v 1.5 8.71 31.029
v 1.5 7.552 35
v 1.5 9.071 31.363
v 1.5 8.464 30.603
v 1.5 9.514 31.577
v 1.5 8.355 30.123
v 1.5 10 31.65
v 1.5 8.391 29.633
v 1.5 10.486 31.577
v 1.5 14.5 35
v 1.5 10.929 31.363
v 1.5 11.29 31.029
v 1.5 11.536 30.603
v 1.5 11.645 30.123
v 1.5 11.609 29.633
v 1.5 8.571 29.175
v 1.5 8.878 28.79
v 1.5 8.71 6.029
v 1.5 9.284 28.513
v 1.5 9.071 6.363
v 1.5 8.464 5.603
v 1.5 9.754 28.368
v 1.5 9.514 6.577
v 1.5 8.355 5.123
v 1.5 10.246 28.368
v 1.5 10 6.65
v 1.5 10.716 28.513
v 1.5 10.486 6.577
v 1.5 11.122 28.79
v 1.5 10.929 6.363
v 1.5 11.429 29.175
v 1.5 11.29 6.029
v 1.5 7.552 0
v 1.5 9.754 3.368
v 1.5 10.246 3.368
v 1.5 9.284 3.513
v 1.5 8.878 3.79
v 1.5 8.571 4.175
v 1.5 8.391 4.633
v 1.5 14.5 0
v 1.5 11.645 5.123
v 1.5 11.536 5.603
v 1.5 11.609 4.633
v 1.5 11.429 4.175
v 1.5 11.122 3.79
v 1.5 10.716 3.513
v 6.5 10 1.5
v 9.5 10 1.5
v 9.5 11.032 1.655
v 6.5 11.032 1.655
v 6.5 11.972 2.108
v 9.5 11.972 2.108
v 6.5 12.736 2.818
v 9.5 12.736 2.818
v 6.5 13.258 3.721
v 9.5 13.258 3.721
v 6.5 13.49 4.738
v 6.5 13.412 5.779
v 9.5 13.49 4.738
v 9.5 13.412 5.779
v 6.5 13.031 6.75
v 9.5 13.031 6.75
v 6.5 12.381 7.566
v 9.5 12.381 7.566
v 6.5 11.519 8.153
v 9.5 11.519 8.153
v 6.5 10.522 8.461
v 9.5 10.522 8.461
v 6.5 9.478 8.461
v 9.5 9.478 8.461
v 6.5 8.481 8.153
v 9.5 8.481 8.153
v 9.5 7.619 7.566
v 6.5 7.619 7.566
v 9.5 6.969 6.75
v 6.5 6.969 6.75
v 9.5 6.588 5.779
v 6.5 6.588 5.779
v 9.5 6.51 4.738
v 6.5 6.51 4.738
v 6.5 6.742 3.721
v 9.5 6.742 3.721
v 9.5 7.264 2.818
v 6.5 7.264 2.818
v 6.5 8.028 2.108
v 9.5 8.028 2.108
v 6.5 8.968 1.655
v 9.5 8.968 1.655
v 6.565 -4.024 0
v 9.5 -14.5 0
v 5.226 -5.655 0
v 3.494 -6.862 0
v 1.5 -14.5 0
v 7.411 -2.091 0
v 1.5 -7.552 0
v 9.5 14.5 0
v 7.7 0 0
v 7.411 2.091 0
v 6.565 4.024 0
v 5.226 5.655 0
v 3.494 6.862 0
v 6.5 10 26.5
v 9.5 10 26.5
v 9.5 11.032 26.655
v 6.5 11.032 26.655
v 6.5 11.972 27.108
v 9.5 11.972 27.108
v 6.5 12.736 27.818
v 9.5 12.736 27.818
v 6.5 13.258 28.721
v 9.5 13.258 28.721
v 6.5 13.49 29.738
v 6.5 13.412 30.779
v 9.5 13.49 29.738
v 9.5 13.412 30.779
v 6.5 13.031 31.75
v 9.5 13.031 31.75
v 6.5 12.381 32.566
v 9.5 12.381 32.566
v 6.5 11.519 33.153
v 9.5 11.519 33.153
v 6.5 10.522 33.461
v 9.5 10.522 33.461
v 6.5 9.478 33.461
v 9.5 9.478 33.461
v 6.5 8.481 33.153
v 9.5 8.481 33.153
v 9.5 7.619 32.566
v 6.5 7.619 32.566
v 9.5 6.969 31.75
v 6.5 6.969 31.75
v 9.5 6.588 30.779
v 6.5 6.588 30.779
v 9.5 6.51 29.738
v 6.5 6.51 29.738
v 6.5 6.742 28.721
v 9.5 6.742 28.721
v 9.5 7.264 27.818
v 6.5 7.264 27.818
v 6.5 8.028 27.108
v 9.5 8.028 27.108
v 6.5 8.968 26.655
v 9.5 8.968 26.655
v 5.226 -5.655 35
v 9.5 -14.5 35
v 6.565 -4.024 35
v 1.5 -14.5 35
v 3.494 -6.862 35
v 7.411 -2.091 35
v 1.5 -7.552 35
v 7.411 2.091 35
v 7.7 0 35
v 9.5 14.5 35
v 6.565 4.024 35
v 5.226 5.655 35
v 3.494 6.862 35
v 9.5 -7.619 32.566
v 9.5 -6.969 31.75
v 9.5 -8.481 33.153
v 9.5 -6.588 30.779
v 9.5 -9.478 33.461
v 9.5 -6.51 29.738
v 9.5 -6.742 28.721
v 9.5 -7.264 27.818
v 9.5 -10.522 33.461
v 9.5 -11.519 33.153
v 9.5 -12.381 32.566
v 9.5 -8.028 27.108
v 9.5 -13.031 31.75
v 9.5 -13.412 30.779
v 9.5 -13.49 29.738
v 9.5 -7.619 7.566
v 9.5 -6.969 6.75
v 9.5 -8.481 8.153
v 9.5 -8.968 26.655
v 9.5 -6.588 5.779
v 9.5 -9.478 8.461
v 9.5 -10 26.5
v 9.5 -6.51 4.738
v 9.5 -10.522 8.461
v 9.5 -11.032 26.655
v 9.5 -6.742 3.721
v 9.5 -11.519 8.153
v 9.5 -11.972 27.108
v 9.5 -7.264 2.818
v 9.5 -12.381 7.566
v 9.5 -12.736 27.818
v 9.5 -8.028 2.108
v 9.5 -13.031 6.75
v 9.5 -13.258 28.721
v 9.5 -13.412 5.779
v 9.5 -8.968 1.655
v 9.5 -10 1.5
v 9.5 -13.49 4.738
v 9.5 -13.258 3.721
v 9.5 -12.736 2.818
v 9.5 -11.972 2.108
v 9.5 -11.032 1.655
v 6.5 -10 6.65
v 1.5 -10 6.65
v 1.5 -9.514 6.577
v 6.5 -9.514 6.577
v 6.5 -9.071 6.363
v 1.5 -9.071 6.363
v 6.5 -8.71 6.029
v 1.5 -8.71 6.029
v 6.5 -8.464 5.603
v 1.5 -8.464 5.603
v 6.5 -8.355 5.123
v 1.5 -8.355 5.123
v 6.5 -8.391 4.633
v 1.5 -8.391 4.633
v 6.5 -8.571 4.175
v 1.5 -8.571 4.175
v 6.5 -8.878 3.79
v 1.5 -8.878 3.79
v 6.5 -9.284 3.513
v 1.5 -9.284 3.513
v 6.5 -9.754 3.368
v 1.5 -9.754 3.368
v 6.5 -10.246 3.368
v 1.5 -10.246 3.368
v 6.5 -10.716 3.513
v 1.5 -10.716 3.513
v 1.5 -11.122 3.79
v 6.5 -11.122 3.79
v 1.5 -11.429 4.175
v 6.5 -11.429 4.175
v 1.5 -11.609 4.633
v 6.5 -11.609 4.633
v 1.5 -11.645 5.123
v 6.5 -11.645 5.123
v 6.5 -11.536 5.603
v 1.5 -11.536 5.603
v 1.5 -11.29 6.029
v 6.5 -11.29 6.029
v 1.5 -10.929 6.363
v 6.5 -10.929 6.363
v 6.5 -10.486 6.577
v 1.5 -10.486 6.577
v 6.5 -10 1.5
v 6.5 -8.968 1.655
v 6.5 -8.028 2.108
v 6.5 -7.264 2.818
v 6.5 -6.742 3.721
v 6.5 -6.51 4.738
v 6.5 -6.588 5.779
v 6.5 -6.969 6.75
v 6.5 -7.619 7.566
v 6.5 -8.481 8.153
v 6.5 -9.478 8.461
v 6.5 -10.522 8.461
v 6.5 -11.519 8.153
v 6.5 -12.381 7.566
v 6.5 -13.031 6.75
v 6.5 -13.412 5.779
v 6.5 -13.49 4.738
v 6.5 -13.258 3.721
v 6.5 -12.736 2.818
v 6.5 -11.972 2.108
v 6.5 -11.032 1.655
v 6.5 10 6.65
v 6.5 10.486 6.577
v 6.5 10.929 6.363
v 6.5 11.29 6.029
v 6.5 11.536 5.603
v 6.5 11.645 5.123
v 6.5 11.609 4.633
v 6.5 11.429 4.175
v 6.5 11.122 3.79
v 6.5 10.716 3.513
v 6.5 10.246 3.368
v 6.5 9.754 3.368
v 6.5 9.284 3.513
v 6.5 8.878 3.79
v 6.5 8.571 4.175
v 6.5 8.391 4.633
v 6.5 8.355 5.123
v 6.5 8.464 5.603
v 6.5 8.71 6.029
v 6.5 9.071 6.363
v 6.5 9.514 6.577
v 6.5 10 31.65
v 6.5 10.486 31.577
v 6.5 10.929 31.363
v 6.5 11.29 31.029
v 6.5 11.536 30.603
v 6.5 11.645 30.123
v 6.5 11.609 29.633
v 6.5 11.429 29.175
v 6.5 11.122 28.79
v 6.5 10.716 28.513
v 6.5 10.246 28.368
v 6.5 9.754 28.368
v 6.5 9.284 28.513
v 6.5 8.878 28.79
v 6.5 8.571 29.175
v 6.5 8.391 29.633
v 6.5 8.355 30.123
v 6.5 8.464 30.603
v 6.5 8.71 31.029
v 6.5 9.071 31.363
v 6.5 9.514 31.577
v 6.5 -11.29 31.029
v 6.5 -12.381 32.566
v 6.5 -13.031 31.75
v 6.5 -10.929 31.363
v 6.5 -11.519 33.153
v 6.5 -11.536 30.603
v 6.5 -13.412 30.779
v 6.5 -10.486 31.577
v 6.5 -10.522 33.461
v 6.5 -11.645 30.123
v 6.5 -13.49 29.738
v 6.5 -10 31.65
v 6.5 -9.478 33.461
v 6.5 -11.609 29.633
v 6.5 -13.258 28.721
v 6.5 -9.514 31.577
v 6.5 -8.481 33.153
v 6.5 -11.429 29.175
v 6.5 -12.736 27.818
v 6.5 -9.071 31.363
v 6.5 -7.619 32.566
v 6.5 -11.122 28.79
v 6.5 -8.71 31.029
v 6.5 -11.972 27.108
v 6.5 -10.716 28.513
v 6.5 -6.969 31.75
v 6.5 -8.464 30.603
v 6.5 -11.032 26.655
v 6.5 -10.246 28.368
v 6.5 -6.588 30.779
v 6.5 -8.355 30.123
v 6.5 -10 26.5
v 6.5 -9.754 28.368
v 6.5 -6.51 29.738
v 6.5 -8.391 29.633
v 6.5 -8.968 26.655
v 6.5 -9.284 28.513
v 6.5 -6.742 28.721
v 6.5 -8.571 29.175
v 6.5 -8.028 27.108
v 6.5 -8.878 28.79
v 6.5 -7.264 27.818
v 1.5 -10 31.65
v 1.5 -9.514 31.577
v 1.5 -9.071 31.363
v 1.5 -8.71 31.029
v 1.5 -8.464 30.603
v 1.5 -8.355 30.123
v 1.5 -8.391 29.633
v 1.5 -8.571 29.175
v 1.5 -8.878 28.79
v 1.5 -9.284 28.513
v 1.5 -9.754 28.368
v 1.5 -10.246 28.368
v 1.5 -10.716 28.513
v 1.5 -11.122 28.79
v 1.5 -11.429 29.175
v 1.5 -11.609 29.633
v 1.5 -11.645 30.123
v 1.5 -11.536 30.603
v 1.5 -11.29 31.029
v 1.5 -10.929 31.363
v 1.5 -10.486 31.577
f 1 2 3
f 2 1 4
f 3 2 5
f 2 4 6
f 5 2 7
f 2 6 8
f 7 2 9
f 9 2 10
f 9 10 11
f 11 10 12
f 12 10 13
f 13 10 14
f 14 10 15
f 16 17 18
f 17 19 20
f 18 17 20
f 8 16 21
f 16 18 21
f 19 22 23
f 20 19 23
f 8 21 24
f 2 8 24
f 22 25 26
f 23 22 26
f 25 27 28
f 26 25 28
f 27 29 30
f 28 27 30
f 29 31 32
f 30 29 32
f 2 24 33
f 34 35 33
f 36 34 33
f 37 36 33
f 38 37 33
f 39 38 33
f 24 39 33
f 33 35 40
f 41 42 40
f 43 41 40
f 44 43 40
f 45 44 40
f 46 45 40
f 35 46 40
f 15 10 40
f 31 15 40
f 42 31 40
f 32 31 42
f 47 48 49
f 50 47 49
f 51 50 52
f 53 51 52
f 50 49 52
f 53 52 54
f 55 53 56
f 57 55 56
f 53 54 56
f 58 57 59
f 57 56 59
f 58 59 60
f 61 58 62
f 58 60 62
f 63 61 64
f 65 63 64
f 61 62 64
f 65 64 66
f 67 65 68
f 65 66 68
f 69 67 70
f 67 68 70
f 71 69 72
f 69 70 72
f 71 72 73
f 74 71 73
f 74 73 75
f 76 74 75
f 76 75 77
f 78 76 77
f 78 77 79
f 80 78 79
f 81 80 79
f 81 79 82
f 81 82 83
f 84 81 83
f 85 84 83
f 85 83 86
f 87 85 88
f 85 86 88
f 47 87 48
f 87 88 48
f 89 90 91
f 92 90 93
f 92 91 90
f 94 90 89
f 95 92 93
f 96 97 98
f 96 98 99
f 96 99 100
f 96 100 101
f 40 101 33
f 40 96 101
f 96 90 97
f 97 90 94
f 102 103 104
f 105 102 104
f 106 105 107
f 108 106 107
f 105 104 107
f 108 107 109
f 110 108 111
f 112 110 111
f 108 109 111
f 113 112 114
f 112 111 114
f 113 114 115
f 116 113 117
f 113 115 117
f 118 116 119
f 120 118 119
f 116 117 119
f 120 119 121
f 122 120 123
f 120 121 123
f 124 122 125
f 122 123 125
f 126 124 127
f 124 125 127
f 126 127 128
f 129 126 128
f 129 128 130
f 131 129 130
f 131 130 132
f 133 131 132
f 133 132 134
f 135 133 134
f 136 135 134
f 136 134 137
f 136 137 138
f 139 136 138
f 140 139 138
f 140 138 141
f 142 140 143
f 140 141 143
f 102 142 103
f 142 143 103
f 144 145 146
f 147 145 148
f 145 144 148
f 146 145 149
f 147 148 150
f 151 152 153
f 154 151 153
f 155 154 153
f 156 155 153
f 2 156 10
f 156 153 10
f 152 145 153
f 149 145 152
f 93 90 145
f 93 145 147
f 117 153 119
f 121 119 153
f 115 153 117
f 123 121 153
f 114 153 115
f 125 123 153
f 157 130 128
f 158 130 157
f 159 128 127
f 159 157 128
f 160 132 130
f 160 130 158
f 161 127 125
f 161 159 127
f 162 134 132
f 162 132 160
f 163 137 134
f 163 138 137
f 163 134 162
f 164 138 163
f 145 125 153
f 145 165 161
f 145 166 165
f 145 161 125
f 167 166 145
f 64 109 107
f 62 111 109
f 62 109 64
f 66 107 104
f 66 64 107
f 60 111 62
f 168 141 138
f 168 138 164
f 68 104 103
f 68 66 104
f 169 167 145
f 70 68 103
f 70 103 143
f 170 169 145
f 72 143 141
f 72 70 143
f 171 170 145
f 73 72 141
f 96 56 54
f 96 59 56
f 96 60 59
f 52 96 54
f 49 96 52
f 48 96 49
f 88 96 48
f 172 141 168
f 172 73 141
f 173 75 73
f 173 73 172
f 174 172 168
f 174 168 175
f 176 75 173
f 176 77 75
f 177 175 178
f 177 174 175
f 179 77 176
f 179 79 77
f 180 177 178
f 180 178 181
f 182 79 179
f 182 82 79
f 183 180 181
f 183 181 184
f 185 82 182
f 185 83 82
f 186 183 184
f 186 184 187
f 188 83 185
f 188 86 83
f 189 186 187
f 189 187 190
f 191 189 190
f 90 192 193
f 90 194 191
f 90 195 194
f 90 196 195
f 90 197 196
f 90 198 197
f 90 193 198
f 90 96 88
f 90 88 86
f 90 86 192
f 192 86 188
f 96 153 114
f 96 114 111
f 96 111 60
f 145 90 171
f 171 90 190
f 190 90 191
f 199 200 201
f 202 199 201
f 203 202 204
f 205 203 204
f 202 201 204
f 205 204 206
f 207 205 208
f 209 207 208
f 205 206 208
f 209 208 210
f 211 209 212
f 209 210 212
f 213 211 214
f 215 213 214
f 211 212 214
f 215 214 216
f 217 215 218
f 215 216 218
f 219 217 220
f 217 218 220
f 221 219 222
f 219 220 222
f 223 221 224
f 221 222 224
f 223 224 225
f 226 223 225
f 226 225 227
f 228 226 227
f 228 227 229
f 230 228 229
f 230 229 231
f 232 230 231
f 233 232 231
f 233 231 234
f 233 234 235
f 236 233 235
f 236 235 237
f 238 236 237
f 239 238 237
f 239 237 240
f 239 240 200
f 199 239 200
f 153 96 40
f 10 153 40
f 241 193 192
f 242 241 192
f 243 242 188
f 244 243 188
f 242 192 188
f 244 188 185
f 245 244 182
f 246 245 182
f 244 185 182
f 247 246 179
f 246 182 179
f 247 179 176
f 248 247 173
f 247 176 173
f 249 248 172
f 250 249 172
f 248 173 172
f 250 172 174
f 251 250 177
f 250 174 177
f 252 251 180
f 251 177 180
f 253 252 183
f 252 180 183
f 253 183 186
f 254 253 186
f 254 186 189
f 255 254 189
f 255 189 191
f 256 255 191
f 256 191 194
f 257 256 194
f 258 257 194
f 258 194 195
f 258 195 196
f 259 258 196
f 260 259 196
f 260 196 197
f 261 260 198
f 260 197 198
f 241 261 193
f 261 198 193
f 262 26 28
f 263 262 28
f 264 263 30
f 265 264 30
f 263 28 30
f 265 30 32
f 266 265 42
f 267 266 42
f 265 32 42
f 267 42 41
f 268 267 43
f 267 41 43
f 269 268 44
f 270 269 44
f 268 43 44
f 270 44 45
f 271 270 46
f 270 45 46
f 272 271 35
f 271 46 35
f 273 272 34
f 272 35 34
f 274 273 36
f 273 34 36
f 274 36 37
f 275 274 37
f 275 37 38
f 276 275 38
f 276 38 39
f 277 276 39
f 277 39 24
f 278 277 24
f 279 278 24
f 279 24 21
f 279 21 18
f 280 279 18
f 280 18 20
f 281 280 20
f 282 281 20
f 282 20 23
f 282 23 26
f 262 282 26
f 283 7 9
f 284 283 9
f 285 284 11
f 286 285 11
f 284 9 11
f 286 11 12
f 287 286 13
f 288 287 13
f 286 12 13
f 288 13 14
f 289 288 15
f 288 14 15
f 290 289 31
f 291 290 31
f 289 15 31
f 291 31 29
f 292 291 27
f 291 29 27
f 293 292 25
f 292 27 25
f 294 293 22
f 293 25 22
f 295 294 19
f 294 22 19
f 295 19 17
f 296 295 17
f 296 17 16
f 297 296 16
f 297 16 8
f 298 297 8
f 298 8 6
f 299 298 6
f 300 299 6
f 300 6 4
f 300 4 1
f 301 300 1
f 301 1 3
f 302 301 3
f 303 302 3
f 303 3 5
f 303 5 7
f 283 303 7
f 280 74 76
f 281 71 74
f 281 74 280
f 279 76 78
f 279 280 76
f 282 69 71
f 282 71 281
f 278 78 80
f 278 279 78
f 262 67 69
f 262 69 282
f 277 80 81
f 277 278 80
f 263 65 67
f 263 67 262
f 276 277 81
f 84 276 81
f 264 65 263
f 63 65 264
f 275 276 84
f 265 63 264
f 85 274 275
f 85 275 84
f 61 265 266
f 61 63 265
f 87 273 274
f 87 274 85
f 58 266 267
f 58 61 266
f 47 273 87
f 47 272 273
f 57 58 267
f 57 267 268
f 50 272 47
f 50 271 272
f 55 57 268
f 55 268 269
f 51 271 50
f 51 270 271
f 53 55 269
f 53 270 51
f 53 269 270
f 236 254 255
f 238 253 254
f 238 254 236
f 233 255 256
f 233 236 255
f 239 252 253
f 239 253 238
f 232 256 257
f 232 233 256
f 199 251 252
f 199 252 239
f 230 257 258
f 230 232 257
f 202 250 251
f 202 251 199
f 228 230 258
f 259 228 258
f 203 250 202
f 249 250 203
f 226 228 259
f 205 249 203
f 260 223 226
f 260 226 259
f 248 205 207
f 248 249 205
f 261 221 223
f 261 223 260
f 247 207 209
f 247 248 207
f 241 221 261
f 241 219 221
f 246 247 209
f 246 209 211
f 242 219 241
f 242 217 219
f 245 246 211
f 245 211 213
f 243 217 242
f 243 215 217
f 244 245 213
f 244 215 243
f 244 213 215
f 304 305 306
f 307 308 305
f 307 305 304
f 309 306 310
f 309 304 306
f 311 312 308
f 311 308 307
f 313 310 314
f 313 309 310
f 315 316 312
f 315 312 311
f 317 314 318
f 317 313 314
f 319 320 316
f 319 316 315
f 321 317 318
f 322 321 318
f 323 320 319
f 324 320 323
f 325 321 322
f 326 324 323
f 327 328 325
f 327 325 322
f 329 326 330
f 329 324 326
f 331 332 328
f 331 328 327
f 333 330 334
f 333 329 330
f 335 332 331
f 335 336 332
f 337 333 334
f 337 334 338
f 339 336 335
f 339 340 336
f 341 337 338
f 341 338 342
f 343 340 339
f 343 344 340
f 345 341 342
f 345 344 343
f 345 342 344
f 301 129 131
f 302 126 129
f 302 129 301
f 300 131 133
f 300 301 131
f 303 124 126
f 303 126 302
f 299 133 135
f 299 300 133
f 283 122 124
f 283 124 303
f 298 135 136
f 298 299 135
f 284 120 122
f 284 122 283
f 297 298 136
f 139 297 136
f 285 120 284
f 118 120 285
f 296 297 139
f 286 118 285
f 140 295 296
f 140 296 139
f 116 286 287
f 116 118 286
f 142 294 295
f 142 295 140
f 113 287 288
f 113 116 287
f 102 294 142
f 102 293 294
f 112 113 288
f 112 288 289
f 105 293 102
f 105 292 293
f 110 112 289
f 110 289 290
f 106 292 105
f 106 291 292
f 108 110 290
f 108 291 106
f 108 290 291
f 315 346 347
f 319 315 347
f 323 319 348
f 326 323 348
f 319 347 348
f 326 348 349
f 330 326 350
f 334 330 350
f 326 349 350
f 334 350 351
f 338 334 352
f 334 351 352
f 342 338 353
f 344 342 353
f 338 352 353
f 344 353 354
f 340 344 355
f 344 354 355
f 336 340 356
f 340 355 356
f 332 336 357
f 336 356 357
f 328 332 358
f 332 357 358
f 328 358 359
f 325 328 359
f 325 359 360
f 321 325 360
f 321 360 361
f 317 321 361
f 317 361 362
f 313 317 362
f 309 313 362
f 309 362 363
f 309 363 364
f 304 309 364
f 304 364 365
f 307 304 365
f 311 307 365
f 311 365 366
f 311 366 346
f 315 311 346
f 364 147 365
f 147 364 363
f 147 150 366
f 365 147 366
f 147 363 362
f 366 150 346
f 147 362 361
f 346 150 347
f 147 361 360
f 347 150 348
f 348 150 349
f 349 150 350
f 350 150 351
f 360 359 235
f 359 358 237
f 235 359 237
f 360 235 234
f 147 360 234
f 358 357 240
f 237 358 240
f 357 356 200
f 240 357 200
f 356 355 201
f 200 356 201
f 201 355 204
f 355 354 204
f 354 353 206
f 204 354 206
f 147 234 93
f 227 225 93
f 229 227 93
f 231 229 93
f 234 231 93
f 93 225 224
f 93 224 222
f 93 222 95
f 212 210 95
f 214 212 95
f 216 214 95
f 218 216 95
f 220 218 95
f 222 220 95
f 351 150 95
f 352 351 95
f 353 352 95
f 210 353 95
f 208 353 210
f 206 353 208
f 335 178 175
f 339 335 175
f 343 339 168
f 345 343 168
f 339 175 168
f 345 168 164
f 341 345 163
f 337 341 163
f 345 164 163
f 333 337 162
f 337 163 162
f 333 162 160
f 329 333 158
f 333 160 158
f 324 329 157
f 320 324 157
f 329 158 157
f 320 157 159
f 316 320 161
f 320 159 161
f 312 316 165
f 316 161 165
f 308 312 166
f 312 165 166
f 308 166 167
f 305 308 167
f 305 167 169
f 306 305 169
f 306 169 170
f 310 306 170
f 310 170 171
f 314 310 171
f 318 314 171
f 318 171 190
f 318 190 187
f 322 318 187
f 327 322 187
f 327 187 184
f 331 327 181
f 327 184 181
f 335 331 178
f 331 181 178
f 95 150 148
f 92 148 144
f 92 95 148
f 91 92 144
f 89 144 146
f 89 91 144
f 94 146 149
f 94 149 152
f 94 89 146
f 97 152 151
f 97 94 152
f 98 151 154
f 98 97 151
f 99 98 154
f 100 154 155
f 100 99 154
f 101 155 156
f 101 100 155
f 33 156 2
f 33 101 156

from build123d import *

# Parameters (mm, degrees)
ESBO_O2_R                  = 7.7
ESBO_O2_W                  = 7
ESBO_O2_H                  = 10
RESSALTO_EXTRUS_O1_DEPTH   = 35
ESBO_O3_R                  = 1.65
CORTE_EXTRUS_O1_DEPTH      = 20
ESBO_O4_R                  = 1.6
CORTE_EXTRUS_O2_DEPTH      = 18.5
CORTE_EXTRUS_O2_DEPTH_BACK = 48.5
CORTE_EXTRUS_O4_START      = -8
ESBO_O8_W                  = 35
ESBO_O8_H                  = 65
CORTE_EXTRUS_O4_DEPTH      = 39
ESBO_O11_W                 = 8
ESBO_O11_H                 = 18
CORTE_EXTRUS_O6_DEPTH      = 1
CORTE_EXTRUS_O6_DEPTH_BACK = 36
ESBO_O12_R                 = 3.5
CORTE_EXTRUS_O7_DEPTH      = 3


with BuildPart() as part:
    # Esboço2 → Ressalto-extrusão1 (new body)
    with BuildSketch(Plane.XY):
        Polygon((-9.5, 15), (-9.5, 32.5), (9.5, 32.5), (9.5, -32.5), (-9.5, -32.5), (-9.5, -15), (-25, -15), (-25, -12), (-9, -12), (-9, -2), (-25, -2), (-36.5, -2), (-36.5, 2), (-20.5, 2), (-20.5, 12), (-36.5, 12), (-36.5, 15), align=None)
        Circle(ESBO_O2_R, mode=Mode.SUBTRACT)
        with Locations((-12.5, 7)):
            Rectangle(ESBO_O2_W, ESBO_O2_H, mode=Mode.SUBTRACT)
    extrude(amount=RESSALTO_EXTRUS_O1_DEPTH)

    # Esboço3 → Corte-extrusão1 (cut, through all)
    with BuildSketch(Plane.ZY.offset(9.5)):
        with Locations((17.5, 18)):
            Circle(ESBO_O3_R)
        with Locations((17.5, -18)):
            Circle(ESBO_O3_R)
        with Locations((5, 10)):
            Circle(ESBO_O3_R)
        with Locations((30, 10)):
            Circle(ESBO_O3_R)
        with Locations((5, -10)):
            Circle(ESBO_O3_R)
        with Locations((30, -10)):
            Circle(ESBO_O3_R)
        Polygon((35, 30.736730193), (25, 32.5), (35, 32.5), align=None)
        Polygon((24.739796996, 20.169435313), (30.057758862, 19.231735154), (29.536814329, 16.277311895), (24.218852463, 17.215012054), align=None)
        with BuildLine():
            Line((21.321510517, 23.818451283), (42.639721186, 20.059475562))
            Line((42.639721186, 20.059475562), (42.813369364, 21.044283315))
            Line((42.813369364, 21.044283315), (21.495158694, 24.803259036))
            ThreePointArc((21.495158694, 24.803259036), (13.560768988, 25.694592711), (21.321510517, 23.818451283))
        make_face()
        with BuildLine():
            Line((42.639721186, -20.059475562), (42.813369364, -21.044283315))
            Line((42.813369364, -21.044283315), (21.495158694, -24.803259036))
            ThreePointArc((21.495158694, -24.803259036), (13.560768988, -25.694592711), (21.321510517, -23.818451283))
            Line((21.321510517, -23.818451283), (42.639721186, -20.059475562))
        make_face()
        Polygon((30.057758862, -19.231735154), (29.536814329, -16.277311895), (24.218852463, -17.215012054), (24.739796996, -20.169435313), align=None)
        Polygon((0, 30.736730193), (10, 32.5), (0, 32.5), align=None)
        Polygon((35, -32.5), (25, -32.5), (35, -30.736730193), align=None)
        Polygon((0, -32.5), (10, -32.5), (0, -30.736730193), align=None)
    extrude(amount=-CORTE_EXTRUS_O1_DEPTH, mode=Mode.SUBTRACT)

    # Esboço4 → Corte-extrusão2 (cut, two sides)
    with BuildSketch(Plane(origin=(0, 15, 0), x_dir=(1, 0, 0), z_dir=(0, 1, 0))) as corte_extrus_o2_sk:
        with Locations((-32, -11.5)):
            Circle(ESBO_O4_R)
        with Locations((-19, -23.5)):
            Circle(ESBO_O4_R)
    extrude(amount=CORTE_EXTRUS_O2_DEPTH, mode=Mode.SUBTRACT)
    extrude(corte_extrus_o2_sk.sketch, amount=-CORTE_EXTRUS_O2_DEPTH_BACK, mode=Mode.SUBTRACT)

    # Esboço8 → Corte-extrusão4 (cut, through all)
    with BuildSketch(Plane(origin=(9.5, 0, 0), x_dir=(0, 0, -1), z_dir=(1, 0, 0)).offset(CORTE_EXTRUS_O4_START)):
        with Locations((-17.5, 0)):
            Rectangle(ESBO_O8_W, ESBO_O8_H)
    extrude(amount=-CORTE_EXTRUS_O4_DEPTH, mode=Mode.SUBTRACT)

    # Esboço11 → Corte-extrusão6 (cut, two sides)
    with BuildSketch(Plane(origin=(0, 0, 0), x_dir=(-1, 0, 0), z_dir=(0, 0, -1))) as corte_extrus_o6_sk:
        with Locations((-5.5, 23.5)):
            Rectangle(ESBO_O11_W, ESBO_O11_H)
        with Locations((-5.5, -23.5)):
            Rectangle(ESBO_O11_W, ESBO_O11_H)
    extrude(amount=CORTE_EXTRUS_O6_DEPTH, mode=Mode.SUBTRACT)
    extrude(corte_extrus_o6_sk.sketch, amount=-CORTE_EXTRUS_O6_DEPTH_BACK, mode=Mode.SUBTRACT)

    # Esboço12 → Corte-extrusão7 (cut)
    with BuildSketch(Plane(origin=(9.5, 0, 0), x_dir=(0, 0, -1), z_dir=(1, 0, 0))):
        with Locations((-30, 10)):
            Circle(ESBO_O12_R)
        with Locations((-5, 10)):
            Circle(ESBO_O12_R)
        with Locations((-5, -10)):
            Circle(ESBO_O12_R)
        with Locations((-30, -10)):
            Circle(ESBO_O12_R)
    extrude(amount=-CORTE_EXTRUS_O7_DEPTH, mode=Mode.SUBTRACT)


solid = part.part
